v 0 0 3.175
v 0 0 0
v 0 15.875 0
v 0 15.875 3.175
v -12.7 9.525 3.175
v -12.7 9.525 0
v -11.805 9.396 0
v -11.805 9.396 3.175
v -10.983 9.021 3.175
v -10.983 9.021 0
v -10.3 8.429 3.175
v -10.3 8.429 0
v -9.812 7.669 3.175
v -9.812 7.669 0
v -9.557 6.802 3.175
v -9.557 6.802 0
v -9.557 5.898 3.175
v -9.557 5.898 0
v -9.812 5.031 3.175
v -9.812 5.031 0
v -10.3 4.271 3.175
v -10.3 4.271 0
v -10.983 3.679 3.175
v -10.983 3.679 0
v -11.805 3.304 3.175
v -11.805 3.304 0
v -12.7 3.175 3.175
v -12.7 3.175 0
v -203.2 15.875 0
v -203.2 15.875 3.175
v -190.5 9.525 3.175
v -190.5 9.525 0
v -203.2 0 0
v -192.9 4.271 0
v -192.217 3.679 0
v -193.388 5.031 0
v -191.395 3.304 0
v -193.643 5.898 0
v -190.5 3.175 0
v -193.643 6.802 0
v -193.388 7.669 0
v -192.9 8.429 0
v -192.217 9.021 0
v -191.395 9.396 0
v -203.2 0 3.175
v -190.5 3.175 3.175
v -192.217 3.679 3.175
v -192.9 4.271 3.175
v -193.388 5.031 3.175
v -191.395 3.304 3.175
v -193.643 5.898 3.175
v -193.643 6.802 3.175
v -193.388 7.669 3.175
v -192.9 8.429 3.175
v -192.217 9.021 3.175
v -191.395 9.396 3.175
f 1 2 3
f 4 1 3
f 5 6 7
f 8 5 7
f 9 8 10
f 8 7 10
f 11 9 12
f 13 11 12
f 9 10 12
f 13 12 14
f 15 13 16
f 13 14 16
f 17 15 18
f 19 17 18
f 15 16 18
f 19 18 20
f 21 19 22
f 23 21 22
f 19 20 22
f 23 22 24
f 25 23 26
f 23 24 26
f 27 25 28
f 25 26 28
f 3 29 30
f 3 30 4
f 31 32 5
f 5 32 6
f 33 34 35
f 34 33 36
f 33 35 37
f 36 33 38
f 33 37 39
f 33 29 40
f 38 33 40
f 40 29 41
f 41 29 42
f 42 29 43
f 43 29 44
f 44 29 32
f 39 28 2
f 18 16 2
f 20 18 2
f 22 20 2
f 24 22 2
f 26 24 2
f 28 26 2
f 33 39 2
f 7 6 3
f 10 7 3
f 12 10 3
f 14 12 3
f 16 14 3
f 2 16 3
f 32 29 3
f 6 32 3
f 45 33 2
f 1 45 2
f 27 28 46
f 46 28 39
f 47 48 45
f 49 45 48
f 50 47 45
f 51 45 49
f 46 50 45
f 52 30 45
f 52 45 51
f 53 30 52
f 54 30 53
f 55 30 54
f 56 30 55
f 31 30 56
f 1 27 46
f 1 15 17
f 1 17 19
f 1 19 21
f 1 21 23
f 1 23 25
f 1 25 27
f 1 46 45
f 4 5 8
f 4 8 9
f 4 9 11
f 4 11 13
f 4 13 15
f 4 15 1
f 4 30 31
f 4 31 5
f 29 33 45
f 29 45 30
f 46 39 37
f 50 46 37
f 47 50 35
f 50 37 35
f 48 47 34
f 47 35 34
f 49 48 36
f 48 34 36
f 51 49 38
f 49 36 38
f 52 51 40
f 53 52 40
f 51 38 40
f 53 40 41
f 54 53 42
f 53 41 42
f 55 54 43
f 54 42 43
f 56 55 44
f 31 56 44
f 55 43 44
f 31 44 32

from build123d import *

# Parameters (mm, degrees)
F0_W     = 203.2
F0_H     = 15.875
F1_DEPTH = 3.175


with BuildPart() as f1:
    # F0 (on Top) → F1 (new body)
    with BuildSketch(Plane.XY):
        with Locations((-101.6, 7.9375)):
            Rectangle(F0_W, F0_H)
        with BuildLine():
            ThreePointArc((-190.5, 3.175), (-193.675, 6.35), (-190.5, 9.525))
            Line((-190.5, 9.525), (-12.7, 9.525))
            ThreePointArc((-12.7, 9.525), (-9.525, 6.35), (-12.7, 3.175))
            Line((-12.7, 3.175), (-190.5, 3.175))
        make_face(mode=Mode.SUBTRACT)
    extrude(amount=F1_DEPTH)


solid = f1.part
